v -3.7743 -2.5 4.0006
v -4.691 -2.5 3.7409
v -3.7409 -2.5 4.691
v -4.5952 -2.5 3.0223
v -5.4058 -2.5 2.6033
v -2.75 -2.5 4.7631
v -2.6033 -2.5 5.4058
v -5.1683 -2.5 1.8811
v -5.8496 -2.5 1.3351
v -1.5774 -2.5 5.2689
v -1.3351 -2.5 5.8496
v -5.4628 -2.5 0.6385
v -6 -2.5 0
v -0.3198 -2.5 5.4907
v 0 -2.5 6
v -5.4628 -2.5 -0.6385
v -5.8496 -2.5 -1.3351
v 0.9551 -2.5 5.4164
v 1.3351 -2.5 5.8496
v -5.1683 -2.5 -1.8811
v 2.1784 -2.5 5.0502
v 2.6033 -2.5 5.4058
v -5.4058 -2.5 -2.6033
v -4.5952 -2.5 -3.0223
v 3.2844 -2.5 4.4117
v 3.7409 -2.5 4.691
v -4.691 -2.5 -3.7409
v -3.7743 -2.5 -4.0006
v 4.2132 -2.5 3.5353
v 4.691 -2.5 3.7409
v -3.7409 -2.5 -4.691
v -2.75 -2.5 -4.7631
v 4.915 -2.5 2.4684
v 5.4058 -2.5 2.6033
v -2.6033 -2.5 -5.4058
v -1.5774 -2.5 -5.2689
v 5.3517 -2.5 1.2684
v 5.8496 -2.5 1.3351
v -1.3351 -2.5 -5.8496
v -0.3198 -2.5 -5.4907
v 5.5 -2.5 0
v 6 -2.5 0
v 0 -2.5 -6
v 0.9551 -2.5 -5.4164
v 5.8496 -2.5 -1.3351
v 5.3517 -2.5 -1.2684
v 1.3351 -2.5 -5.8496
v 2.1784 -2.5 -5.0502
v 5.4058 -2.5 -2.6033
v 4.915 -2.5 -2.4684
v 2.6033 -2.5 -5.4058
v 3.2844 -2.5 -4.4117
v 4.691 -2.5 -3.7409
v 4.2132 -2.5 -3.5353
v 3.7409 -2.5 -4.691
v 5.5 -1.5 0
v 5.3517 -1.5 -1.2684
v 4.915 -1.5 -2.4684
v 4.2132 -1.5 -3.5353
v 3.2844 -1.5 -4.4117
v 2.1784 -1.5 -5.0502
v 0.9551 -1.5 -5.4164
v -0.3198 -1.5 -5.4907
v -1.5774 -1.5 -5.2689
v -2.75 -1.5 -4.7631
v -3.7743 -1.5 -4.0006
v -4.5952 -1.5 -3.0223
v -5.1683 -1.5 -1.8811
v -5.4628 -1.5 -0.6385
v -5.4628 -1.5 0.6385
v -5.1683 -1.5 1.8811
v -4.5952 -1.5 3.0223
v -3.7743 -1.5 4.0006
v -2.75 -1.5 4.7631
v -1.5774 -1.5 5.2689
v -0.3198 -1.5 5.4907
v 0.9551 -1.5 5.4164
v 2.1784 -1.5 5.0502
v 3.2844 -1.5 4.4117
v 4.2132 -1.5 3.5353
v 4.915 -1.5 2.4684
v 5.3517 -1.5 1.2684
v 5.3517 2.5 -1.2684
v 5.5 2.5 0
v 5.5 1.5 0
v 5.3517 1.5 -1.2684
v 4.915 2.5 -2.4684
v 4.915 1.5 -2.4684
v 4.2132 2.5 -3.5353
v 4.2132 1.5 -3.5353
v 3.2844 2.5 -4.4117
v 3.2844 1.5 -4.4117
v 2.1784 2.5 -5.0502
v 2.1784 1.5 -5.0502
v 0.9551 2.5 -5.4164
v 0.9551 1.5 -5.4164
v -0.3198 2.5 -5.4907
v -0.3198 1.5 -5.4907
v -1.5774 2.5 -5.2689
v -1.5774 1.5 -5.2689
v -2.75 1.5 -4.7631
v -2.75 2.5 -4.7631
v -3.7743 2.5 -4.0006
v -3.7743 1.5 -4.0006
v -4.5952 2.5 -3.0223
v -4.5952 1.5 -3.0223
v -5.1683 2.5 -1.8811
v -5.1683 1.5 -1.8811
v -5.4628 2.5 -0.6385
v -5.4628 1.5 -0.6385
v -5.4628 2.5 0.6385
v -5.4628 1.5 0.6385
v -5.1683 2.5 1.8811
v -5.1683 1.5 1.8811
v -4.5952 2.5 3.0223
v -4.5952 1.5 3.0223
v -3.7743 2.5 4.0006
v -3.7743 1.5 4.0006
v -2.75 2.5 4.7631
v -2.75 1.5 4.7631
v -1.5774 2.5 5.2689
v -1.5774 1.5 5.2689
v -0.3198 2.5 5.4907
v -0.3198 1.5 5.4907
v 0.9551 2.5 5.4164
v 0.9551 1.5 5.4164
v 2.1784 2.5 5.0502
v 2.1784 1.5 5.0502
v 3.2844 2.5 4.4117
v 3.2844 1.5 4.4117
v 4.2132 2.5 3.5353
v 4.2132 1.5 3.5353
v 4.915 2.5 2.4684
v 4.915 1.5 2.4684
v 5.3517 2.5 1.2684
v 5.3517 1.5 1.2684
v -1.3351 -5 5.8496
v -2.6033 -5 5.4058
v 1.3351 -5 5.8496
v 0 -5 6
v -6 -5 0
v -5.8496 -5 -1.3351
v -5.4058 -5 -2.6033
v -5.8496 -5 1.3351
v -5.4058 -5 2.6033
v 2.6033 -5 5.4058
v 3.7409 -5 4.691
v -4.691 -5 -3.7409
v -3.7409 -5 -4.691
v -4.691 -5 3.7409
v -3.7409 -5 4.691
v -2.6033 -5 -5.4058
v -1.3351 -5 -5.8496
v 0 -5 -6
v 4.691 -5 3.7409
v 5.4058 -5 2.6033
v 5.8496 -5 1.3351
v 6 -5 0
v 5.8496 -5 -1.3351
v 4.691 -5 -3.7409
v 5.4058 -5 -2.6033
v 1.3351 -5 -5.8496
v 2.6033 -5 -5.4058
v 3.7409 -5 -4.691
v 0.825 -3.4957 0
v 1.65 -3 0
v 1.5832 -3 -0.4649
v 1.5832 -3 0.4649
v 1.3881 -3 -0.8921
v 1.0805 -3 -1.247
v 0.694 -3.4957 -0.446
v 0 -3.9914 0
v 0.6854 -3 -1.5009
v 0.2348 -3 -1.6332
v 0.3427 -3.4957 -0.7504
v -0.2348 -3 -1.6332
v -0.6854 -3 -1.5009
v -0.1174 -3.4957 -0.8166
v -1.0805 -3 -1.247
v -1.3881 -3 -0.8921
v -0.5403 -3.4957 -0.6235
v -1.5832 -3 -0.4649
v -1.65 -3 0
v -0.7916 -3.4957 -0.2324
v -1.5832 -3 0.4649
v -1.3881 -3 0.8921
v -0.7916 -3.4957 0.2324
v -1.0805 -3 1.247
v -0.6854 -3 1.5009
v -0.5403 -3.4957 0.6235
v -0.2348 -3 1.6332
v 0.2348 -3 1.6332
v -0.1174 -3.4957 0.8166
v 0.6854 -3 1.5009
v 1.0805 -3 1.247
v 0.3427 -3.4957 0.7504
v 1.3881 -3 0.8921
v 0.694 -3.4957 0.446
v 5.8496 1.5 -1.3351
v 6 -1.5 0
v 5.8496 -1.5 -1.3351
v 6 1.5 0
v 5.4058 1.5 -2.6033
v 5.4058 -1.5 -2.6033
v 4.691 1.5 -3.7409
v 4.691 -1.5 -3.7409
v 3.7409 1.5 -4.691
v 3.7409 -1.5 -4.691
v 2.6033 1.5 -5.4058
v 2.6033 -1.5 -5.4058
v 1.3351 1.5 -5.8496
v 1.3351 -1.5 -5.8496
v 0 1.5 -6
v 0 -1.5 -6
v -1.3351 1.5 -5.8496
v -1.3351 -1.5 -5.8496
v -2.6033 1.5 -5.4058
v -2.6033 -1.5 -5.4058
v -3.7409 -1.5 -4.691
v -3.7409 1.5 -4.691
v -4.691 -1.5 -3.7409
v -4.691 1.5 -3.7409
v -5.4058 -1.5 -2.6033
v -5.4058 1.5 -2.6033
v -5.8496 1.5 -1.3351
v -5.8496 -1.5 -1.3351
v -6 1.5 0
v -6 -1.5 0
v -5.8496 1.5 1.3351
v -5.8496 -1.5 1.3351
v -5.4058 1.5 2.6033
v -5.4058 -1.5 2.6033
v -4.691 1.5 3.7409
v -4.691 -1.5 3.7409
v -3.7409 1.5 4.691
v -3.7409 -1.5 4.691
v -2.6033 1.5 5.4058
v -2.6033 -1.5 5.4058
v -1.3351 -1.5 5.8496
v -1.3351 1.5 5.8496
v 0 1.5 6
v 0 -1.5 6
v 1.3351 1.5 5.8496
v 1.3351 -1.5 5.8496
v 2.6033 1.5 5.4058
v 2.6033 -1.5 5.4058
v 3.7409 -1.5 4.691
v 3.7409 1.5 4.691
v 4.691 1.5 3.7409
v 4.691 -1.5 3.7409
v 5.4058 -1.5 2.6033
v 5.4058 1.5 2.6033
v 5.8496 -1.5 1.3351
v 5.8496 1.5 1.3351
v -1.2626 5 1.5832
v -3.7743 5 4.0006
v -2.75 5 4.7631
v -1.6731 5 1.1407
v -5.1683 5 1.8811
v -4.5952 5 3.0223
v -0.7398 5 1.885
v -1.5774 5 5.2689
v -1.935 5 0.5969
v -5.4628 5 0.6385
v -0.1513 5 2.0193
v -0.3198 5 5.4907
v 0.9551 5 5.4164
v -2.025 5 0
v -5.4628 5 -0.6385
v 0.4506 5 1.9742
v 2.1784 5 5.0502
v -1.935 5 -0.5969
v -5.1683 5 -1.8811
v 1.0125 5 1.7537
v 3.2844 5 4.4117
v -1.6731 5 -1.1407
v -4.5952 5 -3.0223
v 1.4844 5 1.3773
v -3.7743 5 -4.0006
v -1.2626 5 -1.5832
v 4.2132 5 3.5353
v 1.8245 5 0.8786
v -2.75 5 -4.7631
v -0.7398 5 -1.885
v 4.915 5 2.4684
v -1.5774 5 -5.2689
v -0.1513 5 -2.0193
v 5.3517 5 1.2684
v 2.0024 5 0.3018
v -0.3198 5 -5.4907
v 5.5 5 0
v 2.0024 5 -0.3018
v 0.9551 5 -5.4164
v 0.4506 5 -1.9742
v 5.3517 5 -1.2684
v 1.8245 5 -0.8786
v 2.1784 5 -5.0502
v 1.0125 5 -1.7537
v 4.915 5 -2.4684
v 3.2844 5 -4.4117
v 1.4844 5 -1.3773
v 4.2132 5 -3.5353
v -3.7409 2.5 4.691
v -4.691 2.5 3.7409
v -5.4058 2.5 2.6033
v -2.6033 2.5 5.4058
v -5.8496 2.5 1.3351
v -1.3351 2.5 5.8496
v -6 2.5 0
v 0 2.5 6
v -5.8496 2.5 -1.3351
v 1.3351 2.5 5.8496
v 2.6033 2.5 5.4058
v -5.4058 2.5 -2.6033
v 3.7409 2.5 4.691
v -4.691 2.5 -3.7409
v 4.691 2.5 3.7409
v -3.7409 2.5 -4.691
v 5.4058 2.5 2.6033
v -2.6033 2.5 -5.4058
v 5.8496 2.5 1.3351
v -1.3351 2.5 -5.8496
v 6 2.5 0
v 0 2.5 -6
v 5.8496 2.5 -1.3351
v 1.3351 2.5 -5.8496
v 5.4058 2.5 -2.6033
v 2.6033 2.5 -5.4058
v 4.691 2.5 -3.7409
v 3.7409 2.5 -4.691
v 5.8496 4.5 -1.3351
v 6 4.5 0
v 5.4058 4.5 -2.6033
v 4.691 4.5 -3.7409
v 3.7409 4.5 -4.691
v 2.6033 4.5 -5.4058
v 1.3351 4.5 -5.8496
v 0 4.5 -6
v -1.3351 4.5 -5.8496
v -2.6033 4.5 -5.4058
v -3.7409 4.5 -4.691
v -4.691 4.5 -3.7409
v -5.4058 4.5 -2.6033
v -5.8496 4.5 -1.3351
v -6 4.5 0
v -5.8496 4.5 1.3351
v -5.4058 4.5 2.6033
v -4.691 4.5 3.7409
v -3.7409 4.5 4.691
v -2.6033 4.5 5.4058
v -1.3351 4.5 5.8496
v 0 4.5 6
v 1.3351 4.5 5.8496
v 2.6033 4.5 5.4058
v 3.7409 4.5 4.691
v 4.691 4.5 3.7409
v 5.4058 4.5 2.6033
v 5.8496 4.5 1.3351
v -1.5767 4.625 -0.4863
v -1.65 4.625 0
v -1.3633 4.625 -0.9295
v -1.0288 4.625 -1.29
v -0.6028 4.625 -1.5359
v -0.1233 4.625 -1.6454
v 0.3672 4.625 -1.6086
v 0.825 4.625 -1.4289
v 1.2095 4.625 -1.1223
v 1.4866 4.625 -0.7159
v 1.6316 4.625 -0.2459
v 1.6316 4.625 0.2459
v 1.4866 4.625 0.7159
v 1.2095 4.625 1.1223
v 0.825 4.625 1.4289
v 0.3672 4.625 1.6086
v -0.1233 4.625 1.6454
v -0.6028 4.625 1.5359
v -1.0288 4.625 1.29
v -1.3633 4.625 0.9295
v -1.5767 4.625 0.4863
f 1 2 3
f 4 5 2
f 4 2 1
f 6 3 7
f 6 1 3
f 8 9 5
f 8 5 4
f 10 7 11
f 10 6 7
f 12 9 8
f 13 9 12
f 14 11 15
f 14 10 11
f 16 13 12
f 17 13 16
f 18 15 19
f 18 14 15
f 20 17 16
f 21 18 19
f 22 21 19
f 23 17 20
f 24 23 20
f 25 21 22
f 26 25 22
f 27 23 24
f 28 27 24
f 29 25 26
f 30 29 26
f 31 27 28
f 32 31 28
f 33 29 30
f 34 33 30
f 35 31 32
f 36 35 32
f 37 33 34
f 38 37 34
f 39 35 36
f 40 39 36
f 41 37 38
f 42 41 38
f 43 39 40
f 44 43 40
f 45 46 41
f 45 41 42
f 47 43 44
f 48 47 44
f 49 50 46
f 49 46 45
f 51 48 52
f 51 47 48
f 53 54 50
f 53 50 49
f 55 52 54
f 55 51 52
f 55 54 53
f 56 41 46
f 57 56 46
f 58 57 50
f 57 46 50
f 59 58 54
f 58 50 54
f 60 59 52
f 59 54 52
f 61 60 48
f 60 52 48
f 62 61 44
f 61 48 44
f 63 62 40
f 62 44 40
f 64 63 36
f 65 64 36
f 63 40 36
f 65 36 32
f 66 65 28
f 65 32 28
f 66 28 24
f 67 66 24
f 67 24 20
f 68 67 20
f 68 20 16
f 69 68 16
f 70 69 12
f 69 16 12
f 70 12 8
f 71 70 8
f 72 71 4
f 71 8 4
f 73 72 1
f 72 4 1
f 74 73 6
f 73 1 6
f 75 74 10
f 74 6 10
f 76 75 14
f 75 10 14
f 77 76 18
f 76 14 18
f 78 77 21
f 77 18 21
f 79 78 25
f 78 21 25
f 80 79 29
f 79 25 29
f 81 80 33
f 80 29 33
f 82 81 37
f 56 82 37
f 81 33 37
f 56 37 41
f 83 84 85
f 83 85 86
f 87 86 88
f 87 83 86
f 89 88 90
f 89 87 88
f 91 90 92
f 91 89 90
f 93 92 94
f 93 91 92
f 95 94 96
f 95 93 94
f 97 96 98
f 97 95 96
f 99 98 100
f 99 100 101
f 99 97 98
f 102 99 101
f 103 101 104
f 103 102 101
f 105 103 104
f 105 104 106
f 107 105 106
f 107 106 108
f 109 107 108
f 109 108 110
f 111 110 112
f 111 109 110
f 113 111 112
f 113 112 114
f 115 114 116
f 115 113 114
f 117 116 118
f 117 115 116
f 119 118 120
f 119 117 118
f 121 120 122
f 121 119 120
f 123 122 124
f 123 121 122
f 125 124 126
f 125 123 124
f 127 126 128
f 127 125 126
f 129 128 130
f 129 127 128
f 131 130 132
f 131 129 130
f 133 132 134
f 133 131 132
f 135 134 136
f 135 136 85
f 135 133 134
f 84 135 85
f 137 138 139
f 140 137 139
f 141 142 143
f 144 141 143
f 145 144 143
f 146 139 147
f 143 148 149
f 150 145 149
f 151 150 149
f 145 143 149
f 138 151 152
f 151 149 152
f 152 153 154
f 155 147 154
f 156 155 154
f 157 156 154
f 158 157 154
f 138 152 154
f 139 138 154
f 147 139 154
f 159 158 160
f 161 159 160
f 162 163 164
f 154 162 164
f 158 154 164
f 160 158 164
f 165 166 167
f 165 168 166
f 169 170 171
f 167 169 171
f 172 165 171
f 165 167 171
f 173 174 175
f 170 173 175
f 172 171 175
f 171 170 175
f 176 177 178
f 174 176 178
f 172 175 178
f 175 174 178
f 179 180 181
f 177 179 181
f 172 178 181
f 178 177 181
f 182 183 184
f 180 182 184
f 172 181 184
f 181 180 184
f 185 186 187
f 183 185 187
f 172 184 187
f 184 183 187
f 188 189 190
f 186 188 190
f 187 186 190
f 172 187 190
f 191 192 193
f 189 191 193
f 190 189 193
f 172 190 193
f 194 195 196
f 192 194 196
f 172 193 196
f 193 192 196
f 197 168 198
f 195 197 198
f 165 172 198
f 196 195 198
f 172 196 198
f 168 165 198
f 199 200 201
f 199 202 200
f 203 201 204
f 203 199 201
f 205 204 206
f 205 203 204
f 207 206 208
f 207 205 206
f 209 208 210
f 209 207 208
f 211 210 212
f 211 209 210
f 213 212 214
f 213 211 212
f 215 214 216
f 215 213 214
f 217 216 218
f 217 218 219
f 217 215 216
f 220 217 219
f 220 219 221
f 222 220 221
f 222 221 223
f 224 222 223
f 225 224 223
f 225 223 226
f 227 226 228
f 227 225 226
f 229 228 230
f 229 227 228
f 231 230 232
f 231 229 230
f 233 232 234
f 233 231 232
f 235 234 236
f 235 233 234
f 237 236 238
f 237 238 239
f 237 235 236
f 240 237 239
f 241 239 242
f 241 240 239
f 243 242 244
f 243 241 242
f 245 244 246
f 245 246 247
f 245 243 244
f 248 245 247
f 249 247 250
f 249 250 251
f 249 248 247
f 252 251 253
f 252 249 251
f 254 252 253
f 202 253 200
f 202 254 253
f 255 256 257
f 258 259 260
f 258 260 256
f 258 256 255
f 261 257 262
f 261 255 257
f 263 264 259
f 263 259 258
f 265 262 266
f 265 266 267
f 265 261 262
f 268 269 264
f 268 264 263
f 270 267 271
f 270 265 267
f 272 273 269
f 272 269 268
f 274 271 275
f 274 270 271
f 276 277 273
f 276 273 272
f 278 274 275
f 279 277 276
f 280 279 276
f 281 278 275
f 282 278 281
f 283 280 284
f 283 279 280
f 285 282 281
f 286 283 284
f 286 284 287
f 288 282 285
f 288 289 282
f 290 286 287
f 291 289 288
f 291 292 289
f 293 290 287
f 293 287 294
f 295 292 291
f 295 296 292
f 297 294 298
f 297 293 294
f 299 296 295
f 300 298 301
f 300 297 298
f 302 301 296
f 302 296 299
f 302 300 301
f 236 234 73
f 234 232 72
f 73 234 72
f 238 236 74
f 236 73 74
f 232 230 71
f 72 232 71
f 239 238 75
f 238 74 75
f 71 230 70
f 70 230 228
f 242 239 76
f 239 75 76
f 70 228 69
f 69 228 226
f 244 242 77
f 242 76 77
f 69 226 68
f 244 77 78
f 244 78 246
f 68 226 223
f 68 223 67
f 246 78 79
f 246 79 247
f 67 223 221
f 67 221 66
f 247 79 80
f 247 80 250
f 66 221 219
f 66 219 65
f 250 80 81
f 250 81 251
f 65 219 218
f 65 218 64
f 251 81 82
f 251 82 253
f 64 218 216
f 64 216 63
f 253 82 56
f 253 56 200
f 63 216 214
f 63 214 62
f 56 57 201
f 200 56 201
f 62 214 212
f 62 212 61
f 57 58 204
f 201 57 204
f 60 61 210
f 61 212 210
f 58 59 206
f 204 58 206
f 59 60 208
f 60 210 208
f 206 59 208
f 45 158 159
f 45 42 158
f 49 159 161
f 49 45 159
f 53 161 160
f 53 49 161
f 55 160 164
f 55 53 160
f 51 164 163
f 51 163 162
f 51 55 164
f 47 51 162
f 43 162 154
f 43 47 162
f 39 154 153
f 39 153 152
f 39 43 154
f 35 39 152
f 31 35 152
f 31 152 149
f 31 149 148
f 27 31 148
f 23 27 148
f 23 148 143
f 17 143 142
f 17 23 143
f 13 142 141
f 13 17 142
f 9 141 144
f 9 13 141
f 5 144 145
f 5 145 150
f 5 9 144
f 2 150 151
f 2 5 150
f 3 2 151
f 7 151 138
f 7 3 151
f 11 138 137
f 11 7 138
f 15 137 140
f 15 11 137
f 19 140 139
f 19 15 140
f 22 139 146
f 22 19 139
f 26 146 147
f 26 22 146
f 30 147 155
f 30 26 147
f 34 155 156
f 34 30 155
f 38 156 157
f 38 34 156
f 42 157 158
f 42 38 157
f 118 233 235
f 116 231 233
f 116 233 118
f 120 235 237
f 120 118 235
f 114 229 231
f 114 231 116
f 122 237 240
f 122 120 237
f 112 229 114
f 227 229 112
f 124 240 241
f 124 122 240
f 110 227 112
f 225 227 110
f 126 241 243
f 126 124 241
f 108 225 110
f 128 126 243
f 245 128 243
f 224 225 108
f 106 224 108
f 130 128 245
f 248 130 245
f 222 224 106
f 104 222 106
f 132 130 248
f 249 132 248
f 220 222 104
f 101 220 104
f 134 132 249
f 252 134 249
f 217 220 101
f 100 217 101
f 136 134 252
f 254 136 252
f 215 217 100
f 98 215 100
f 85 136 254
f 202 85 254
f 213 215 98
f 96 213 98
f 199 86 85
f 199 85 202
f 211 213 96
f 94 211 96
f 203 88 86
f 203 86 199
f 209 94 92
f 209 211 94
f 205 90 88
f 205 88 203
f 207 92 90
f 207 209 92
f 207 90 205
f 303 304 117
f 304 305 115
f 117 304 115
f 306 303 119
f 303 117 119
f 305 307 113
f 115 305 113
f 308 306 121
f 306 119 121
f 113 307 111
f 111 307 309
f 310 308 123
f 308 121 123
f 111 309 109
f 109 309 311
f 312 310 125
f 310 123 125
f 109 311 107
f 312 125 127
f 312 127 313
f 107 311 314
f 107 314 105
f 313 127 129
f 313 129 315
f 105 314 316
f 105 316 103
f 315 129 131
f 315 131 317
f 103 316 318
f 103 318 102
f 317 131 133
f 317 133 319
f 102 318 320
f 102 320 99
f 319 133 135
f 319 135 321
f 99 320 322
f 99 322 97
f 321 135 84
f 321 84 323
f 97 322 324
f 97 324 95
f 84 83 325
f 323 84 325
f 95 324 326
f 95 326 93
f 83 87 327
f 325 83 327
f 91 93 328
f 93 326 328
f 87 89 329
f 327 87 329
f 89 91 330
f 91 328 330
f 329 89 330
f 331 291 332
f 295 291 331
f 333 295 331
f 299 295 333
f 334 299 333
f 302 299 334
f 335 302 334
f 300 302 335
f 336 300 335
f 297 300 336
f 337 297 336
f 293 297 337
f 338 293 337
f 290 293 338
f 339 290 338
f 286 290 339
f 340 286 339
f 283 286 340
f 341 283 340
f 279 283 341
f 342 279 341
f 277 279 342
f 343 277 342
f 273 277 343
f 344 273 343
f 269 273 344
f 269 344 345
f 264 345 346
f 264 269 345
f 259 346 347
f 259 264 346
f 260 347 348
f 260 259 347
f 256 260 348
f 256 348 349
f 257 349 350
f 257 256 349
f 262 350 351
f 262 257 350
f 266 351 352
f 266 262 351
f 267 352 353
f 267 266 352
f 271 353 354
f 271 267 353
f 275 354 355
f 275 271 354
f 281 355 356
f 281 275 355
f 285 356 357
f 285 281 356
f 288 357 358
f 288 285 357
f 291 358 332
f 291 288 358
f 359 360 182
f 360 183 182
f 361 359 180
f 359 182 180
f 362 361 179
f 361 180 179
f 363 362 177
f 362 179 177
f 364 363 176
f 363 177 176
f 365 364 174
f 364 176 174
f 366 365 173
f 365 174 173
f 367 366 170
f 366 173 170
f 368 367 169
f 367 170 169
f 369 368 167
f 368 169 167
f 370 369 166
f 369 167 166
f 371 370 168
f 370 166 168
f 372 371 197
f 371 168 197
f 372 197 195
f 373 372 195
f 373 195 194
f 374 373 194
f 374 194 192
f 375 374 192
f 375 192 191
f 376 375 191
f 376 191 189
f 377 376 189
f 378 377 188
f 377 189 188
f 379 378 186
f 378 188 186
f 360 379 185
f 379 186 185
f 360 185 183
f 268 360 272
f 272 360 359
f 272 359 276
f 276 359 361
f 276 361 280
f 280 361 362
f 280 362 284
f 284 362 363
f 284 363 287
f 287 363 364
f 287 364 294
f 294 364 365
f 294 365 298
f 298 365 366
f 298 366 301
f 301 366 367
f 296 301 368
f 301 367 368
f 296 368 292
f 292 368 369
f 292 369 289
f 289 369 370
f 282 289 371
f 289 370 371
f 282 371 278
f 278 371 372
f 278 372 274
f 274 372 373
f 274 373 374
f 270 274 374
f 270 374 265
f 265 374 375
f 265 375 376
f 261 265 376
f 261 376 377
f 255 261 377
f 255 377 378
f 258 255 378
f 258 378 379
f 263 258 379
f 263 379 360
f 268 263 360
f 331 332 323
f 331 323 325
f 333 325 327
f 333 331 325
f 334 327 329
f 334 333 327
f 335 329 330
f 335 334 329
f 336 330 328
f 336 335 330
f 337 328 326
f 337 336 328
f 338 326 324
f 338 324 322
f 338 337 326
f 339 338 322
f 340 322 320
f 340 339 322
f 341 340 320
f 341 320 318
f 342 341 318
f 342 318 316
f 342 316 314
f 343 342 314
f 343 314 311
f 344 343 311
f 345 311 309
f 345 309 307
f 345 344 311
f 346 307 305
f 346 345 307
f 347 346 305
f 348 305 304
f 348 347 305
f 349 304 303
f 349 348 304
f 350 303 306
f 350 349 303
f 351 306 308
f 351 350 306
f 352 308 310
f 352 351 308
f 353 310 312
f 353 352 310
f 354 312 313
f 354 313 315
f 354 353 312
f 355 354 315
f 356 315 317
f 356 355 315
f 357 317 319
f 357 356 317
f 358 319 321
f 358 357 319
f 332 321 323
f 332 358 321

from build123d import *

# Parameters (mm, degrees)
SKETCH1_R                       = 6
BOSS_EXTRUDE1_DEPTH             = 5
CUT_EXTRUDE1_START              = -2.5
SKETCH2_R                       = 6
SKETCH2_R_2                     = 5.5
CUT_EXTRUDE1_DEPTH              = 1
CHAMFER1_SIZE                   = 0.5
M4X0_7_TAPPED_HOLE1_D           = 3.3
M4X0_7_TAPPED_HOLE1_DEPTH       = 8
M4X0_7_TAPPED_HOLE1_CSINK_D     = 4.05
M4X0_7_TAPPED_HOLE1_CSINK_ANGLE = 90
M4X0_7_TAPPED_HOLE1_TIP         = 0.991420021


with BuildPart() as part:
    # Sketch1 → Boss-Extrude1 (new body, symmetric)
    with BuildSketch(Plane(origin=(0, 0, 0), x_dir=(1, 0, 0), z_dir=(0, 1, 0))):
        Circle(SKETCH1_R)
    extrude(amount=BOSS_EXTRUDE1_DEPTH, both=True)

    # Sketch2 → Cut-Extrude1 (cut)
    with BuildSketch(Plane(origin=(0, 5, 0), x_dir=(1, 0, 0), z_dir=(0, 1, 0)).offset(CUT_EXTRUDE1_START)):
        Circle(SKETCH2_R)
        Circle(SKETCH2_R_2, mode=Mode.SUBTRACT)
    cut_extrude1 = extrude(amount=-CUT_EXTRUDE1_DEPTH, mode=Mode.SUBTRACT)

    # Mirror1: Cut-Extrude1 across plane
    add(cut_extrude1.mirror(Plane.ZX), mode=Mode.SUBTRACT)

    # Chamfer1
    chamfer1_edges = [part.edges().sort_by_distance(p)[0] for p in [
        (-6, 5, 0),
    ]]
    chamfer(chamfer1_edges, length=CHAMFER1_SIZE)

    # M4x0.7 Tapped Hole1
    with Locations(Plane(origin=(0, 5, 0), x_dir=(1, 0, 0), z_dir=(0, 1, 0))):
        with Locations((0, 0)):
            CounterSinkHole(M4X0_7_TAPPED_HOLE1_D / 2, M4X0_7_TAPPED_HOLE1_CSINK_D / 2, depth=M4X0_7_TAPPED_HOLE1_DEPTH, counter_sink_angle=M4X0_7_TAPPED_HOLE1_CSINK_ANGLE)
            with Locations((0, 0, -(M4X0_7_TAPPED_HOLE1_DEPTH + M4X0_7_TAPPED_HOLE1_TIP / 2))):  # 118° drill point
                Cone(0, M4X0_7_TAPPED_HOLE1_D / 2, M4X0_7_TAPPED_HOLE1_TIP, mode=Mode.SUBTRACT)


solid = part.part
